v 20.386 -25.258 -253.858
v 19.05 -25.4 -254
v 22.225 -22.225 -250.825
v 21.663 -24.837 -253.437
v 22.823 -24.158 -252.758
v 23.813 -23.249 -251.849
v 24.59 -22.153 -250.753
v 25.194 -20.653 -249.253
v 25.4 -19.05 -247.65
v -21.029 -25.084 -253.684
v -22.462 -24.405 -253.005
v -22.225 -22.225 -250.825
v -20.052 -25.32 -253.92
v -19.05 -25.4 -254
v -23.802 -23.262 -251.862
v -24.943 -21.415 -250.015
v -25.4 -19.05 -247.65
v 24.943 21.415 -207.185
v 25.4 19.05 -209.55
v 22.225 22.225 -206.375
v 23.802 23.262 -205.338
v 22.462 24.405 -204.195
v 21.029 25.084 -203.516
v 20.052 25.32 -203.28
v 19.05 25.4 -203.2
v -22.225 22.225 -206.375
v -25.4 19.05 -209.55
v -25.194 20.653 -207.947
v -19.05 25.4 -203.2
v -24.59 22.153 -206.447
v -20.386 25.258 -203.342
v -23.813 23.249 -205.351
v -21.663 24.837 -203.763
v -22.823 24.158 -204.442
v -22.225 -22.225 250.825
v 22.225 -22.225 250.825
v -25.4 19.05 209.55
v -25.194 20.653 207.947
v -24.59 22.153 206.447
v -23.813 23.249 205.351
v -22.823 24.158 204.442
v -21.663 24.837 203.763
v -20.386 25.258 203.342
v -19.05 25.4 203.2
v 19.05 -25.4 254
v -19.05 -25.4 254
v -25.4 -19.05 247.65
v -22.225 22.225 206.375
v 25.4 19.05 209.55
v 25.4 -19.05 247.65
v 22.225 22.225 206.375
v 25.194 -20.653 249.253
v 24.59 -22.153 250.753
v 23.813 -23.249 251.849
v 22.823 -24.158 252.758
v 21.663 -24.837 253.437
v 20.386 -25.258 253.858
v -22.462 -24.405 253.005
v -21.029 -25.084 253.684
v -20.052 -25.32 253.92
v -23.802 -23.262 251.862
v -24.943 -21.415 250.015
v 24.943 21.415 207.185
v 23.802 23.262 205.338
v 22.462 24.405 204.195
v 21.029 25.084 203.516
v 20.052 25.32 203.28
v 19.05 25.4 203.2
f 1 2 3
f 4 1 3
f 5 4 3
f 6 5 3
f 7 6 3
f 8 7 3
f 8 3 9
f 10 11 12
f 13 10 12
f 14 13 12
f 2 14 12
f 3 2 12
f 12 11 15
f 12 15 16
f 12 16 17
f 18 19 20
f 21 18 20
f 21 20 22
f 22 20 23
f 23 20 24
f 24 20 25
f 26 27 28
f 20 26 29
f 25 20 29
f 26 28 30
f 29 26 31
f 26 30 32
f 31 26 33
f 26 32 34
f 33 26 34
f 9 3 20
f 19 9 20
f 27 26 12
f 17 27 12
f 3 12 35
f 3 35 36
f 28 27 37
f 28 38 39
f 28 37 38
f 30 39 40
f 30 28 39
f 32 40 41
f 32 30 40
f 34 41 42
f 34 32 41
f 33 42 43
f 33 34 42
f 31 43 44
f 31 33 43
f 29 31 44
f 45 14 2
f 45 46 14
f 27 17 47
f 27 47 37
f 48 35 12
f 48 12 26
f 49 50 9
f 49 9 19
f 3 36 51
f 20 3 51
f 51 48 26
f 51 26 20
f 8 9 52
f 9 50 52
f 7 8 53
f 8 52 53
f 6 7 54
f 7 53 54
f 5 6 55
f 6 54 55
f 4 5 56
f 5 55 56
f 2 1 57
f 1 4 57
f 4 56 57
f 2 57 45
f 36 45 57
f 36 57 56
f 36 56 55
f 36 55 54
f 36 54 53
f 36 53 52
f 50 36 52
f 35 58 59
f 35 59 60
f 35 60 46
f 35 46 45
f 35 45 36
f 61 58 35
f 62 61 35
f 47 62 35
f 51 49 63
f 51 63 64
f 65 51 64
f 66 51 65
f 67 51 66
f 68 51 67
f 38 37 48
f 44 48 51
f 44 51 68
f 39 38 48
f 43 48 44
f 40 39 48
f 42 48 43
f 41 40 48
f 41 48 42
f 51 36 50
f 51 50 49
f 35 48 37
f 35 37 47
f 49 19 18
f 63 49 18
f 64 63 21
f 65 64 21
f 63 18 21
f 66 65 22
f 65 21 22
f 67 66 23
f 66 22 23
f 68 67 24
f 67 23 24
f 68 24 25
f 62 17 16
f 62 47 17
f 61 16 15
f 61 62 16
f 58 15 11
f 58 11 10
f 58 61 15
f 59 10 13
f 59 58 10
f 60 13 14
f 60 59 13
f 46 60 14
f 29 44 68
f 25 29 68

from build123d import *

# Parameters (mm, degrees)
SKETCH1_W           = 50.8
SKETCH1_H           = 50.8
SKETCH1_W_2         = 44.45
SKETCH1_H_2         = 44.45
BOSS_EXTRUDE1_DEPTH = 254
FILLET1_R           = 6.35
CUT_EXTRUDE1_DEPTH  = 914.4


with BuildPart() as part:
    # Sketch1 → Boss-Extrude1 (new, symmetric)
    with BuildSketch(Plane.XY):
        Rectangle(SKETCH1_W, SKETCH1_H)
        Rectangle(SKETCH1_W_2, SKETCH1_H_2, mode=Mode.SUBTRACT)
    extrude(amount=BOSS_EXTRUDE1_DEPTH, both=True)

    # Fillet1
    fillet1_edges = [part.edges().sort_by_distance(p)[0] for p in [
        (-25.4, 25.4, 0),
        (25.4, 25.4, 0),
        (25.4, -25.4, 0),
        (-25.4, -25.4, 0),
    ]]
    fillet(fillet1_edges, radius=FILLET1_R)

    # Sketch2 → Cut-Extrude1 (cut)
    with BuildSketch(Plane.ZY.offset(25.4)):
        Polygon((254, -25.4), (203.2, 25.4), (254, 25.4), align=None)
        Polygon((-254, 25.4), (-254, -25.4), (-203.2, 25.4), align=None)
    extrude(amount=-CUT_EXTRUDE1_DEPTH, mode=Mode.SUBTRACT)


solid = part.part
